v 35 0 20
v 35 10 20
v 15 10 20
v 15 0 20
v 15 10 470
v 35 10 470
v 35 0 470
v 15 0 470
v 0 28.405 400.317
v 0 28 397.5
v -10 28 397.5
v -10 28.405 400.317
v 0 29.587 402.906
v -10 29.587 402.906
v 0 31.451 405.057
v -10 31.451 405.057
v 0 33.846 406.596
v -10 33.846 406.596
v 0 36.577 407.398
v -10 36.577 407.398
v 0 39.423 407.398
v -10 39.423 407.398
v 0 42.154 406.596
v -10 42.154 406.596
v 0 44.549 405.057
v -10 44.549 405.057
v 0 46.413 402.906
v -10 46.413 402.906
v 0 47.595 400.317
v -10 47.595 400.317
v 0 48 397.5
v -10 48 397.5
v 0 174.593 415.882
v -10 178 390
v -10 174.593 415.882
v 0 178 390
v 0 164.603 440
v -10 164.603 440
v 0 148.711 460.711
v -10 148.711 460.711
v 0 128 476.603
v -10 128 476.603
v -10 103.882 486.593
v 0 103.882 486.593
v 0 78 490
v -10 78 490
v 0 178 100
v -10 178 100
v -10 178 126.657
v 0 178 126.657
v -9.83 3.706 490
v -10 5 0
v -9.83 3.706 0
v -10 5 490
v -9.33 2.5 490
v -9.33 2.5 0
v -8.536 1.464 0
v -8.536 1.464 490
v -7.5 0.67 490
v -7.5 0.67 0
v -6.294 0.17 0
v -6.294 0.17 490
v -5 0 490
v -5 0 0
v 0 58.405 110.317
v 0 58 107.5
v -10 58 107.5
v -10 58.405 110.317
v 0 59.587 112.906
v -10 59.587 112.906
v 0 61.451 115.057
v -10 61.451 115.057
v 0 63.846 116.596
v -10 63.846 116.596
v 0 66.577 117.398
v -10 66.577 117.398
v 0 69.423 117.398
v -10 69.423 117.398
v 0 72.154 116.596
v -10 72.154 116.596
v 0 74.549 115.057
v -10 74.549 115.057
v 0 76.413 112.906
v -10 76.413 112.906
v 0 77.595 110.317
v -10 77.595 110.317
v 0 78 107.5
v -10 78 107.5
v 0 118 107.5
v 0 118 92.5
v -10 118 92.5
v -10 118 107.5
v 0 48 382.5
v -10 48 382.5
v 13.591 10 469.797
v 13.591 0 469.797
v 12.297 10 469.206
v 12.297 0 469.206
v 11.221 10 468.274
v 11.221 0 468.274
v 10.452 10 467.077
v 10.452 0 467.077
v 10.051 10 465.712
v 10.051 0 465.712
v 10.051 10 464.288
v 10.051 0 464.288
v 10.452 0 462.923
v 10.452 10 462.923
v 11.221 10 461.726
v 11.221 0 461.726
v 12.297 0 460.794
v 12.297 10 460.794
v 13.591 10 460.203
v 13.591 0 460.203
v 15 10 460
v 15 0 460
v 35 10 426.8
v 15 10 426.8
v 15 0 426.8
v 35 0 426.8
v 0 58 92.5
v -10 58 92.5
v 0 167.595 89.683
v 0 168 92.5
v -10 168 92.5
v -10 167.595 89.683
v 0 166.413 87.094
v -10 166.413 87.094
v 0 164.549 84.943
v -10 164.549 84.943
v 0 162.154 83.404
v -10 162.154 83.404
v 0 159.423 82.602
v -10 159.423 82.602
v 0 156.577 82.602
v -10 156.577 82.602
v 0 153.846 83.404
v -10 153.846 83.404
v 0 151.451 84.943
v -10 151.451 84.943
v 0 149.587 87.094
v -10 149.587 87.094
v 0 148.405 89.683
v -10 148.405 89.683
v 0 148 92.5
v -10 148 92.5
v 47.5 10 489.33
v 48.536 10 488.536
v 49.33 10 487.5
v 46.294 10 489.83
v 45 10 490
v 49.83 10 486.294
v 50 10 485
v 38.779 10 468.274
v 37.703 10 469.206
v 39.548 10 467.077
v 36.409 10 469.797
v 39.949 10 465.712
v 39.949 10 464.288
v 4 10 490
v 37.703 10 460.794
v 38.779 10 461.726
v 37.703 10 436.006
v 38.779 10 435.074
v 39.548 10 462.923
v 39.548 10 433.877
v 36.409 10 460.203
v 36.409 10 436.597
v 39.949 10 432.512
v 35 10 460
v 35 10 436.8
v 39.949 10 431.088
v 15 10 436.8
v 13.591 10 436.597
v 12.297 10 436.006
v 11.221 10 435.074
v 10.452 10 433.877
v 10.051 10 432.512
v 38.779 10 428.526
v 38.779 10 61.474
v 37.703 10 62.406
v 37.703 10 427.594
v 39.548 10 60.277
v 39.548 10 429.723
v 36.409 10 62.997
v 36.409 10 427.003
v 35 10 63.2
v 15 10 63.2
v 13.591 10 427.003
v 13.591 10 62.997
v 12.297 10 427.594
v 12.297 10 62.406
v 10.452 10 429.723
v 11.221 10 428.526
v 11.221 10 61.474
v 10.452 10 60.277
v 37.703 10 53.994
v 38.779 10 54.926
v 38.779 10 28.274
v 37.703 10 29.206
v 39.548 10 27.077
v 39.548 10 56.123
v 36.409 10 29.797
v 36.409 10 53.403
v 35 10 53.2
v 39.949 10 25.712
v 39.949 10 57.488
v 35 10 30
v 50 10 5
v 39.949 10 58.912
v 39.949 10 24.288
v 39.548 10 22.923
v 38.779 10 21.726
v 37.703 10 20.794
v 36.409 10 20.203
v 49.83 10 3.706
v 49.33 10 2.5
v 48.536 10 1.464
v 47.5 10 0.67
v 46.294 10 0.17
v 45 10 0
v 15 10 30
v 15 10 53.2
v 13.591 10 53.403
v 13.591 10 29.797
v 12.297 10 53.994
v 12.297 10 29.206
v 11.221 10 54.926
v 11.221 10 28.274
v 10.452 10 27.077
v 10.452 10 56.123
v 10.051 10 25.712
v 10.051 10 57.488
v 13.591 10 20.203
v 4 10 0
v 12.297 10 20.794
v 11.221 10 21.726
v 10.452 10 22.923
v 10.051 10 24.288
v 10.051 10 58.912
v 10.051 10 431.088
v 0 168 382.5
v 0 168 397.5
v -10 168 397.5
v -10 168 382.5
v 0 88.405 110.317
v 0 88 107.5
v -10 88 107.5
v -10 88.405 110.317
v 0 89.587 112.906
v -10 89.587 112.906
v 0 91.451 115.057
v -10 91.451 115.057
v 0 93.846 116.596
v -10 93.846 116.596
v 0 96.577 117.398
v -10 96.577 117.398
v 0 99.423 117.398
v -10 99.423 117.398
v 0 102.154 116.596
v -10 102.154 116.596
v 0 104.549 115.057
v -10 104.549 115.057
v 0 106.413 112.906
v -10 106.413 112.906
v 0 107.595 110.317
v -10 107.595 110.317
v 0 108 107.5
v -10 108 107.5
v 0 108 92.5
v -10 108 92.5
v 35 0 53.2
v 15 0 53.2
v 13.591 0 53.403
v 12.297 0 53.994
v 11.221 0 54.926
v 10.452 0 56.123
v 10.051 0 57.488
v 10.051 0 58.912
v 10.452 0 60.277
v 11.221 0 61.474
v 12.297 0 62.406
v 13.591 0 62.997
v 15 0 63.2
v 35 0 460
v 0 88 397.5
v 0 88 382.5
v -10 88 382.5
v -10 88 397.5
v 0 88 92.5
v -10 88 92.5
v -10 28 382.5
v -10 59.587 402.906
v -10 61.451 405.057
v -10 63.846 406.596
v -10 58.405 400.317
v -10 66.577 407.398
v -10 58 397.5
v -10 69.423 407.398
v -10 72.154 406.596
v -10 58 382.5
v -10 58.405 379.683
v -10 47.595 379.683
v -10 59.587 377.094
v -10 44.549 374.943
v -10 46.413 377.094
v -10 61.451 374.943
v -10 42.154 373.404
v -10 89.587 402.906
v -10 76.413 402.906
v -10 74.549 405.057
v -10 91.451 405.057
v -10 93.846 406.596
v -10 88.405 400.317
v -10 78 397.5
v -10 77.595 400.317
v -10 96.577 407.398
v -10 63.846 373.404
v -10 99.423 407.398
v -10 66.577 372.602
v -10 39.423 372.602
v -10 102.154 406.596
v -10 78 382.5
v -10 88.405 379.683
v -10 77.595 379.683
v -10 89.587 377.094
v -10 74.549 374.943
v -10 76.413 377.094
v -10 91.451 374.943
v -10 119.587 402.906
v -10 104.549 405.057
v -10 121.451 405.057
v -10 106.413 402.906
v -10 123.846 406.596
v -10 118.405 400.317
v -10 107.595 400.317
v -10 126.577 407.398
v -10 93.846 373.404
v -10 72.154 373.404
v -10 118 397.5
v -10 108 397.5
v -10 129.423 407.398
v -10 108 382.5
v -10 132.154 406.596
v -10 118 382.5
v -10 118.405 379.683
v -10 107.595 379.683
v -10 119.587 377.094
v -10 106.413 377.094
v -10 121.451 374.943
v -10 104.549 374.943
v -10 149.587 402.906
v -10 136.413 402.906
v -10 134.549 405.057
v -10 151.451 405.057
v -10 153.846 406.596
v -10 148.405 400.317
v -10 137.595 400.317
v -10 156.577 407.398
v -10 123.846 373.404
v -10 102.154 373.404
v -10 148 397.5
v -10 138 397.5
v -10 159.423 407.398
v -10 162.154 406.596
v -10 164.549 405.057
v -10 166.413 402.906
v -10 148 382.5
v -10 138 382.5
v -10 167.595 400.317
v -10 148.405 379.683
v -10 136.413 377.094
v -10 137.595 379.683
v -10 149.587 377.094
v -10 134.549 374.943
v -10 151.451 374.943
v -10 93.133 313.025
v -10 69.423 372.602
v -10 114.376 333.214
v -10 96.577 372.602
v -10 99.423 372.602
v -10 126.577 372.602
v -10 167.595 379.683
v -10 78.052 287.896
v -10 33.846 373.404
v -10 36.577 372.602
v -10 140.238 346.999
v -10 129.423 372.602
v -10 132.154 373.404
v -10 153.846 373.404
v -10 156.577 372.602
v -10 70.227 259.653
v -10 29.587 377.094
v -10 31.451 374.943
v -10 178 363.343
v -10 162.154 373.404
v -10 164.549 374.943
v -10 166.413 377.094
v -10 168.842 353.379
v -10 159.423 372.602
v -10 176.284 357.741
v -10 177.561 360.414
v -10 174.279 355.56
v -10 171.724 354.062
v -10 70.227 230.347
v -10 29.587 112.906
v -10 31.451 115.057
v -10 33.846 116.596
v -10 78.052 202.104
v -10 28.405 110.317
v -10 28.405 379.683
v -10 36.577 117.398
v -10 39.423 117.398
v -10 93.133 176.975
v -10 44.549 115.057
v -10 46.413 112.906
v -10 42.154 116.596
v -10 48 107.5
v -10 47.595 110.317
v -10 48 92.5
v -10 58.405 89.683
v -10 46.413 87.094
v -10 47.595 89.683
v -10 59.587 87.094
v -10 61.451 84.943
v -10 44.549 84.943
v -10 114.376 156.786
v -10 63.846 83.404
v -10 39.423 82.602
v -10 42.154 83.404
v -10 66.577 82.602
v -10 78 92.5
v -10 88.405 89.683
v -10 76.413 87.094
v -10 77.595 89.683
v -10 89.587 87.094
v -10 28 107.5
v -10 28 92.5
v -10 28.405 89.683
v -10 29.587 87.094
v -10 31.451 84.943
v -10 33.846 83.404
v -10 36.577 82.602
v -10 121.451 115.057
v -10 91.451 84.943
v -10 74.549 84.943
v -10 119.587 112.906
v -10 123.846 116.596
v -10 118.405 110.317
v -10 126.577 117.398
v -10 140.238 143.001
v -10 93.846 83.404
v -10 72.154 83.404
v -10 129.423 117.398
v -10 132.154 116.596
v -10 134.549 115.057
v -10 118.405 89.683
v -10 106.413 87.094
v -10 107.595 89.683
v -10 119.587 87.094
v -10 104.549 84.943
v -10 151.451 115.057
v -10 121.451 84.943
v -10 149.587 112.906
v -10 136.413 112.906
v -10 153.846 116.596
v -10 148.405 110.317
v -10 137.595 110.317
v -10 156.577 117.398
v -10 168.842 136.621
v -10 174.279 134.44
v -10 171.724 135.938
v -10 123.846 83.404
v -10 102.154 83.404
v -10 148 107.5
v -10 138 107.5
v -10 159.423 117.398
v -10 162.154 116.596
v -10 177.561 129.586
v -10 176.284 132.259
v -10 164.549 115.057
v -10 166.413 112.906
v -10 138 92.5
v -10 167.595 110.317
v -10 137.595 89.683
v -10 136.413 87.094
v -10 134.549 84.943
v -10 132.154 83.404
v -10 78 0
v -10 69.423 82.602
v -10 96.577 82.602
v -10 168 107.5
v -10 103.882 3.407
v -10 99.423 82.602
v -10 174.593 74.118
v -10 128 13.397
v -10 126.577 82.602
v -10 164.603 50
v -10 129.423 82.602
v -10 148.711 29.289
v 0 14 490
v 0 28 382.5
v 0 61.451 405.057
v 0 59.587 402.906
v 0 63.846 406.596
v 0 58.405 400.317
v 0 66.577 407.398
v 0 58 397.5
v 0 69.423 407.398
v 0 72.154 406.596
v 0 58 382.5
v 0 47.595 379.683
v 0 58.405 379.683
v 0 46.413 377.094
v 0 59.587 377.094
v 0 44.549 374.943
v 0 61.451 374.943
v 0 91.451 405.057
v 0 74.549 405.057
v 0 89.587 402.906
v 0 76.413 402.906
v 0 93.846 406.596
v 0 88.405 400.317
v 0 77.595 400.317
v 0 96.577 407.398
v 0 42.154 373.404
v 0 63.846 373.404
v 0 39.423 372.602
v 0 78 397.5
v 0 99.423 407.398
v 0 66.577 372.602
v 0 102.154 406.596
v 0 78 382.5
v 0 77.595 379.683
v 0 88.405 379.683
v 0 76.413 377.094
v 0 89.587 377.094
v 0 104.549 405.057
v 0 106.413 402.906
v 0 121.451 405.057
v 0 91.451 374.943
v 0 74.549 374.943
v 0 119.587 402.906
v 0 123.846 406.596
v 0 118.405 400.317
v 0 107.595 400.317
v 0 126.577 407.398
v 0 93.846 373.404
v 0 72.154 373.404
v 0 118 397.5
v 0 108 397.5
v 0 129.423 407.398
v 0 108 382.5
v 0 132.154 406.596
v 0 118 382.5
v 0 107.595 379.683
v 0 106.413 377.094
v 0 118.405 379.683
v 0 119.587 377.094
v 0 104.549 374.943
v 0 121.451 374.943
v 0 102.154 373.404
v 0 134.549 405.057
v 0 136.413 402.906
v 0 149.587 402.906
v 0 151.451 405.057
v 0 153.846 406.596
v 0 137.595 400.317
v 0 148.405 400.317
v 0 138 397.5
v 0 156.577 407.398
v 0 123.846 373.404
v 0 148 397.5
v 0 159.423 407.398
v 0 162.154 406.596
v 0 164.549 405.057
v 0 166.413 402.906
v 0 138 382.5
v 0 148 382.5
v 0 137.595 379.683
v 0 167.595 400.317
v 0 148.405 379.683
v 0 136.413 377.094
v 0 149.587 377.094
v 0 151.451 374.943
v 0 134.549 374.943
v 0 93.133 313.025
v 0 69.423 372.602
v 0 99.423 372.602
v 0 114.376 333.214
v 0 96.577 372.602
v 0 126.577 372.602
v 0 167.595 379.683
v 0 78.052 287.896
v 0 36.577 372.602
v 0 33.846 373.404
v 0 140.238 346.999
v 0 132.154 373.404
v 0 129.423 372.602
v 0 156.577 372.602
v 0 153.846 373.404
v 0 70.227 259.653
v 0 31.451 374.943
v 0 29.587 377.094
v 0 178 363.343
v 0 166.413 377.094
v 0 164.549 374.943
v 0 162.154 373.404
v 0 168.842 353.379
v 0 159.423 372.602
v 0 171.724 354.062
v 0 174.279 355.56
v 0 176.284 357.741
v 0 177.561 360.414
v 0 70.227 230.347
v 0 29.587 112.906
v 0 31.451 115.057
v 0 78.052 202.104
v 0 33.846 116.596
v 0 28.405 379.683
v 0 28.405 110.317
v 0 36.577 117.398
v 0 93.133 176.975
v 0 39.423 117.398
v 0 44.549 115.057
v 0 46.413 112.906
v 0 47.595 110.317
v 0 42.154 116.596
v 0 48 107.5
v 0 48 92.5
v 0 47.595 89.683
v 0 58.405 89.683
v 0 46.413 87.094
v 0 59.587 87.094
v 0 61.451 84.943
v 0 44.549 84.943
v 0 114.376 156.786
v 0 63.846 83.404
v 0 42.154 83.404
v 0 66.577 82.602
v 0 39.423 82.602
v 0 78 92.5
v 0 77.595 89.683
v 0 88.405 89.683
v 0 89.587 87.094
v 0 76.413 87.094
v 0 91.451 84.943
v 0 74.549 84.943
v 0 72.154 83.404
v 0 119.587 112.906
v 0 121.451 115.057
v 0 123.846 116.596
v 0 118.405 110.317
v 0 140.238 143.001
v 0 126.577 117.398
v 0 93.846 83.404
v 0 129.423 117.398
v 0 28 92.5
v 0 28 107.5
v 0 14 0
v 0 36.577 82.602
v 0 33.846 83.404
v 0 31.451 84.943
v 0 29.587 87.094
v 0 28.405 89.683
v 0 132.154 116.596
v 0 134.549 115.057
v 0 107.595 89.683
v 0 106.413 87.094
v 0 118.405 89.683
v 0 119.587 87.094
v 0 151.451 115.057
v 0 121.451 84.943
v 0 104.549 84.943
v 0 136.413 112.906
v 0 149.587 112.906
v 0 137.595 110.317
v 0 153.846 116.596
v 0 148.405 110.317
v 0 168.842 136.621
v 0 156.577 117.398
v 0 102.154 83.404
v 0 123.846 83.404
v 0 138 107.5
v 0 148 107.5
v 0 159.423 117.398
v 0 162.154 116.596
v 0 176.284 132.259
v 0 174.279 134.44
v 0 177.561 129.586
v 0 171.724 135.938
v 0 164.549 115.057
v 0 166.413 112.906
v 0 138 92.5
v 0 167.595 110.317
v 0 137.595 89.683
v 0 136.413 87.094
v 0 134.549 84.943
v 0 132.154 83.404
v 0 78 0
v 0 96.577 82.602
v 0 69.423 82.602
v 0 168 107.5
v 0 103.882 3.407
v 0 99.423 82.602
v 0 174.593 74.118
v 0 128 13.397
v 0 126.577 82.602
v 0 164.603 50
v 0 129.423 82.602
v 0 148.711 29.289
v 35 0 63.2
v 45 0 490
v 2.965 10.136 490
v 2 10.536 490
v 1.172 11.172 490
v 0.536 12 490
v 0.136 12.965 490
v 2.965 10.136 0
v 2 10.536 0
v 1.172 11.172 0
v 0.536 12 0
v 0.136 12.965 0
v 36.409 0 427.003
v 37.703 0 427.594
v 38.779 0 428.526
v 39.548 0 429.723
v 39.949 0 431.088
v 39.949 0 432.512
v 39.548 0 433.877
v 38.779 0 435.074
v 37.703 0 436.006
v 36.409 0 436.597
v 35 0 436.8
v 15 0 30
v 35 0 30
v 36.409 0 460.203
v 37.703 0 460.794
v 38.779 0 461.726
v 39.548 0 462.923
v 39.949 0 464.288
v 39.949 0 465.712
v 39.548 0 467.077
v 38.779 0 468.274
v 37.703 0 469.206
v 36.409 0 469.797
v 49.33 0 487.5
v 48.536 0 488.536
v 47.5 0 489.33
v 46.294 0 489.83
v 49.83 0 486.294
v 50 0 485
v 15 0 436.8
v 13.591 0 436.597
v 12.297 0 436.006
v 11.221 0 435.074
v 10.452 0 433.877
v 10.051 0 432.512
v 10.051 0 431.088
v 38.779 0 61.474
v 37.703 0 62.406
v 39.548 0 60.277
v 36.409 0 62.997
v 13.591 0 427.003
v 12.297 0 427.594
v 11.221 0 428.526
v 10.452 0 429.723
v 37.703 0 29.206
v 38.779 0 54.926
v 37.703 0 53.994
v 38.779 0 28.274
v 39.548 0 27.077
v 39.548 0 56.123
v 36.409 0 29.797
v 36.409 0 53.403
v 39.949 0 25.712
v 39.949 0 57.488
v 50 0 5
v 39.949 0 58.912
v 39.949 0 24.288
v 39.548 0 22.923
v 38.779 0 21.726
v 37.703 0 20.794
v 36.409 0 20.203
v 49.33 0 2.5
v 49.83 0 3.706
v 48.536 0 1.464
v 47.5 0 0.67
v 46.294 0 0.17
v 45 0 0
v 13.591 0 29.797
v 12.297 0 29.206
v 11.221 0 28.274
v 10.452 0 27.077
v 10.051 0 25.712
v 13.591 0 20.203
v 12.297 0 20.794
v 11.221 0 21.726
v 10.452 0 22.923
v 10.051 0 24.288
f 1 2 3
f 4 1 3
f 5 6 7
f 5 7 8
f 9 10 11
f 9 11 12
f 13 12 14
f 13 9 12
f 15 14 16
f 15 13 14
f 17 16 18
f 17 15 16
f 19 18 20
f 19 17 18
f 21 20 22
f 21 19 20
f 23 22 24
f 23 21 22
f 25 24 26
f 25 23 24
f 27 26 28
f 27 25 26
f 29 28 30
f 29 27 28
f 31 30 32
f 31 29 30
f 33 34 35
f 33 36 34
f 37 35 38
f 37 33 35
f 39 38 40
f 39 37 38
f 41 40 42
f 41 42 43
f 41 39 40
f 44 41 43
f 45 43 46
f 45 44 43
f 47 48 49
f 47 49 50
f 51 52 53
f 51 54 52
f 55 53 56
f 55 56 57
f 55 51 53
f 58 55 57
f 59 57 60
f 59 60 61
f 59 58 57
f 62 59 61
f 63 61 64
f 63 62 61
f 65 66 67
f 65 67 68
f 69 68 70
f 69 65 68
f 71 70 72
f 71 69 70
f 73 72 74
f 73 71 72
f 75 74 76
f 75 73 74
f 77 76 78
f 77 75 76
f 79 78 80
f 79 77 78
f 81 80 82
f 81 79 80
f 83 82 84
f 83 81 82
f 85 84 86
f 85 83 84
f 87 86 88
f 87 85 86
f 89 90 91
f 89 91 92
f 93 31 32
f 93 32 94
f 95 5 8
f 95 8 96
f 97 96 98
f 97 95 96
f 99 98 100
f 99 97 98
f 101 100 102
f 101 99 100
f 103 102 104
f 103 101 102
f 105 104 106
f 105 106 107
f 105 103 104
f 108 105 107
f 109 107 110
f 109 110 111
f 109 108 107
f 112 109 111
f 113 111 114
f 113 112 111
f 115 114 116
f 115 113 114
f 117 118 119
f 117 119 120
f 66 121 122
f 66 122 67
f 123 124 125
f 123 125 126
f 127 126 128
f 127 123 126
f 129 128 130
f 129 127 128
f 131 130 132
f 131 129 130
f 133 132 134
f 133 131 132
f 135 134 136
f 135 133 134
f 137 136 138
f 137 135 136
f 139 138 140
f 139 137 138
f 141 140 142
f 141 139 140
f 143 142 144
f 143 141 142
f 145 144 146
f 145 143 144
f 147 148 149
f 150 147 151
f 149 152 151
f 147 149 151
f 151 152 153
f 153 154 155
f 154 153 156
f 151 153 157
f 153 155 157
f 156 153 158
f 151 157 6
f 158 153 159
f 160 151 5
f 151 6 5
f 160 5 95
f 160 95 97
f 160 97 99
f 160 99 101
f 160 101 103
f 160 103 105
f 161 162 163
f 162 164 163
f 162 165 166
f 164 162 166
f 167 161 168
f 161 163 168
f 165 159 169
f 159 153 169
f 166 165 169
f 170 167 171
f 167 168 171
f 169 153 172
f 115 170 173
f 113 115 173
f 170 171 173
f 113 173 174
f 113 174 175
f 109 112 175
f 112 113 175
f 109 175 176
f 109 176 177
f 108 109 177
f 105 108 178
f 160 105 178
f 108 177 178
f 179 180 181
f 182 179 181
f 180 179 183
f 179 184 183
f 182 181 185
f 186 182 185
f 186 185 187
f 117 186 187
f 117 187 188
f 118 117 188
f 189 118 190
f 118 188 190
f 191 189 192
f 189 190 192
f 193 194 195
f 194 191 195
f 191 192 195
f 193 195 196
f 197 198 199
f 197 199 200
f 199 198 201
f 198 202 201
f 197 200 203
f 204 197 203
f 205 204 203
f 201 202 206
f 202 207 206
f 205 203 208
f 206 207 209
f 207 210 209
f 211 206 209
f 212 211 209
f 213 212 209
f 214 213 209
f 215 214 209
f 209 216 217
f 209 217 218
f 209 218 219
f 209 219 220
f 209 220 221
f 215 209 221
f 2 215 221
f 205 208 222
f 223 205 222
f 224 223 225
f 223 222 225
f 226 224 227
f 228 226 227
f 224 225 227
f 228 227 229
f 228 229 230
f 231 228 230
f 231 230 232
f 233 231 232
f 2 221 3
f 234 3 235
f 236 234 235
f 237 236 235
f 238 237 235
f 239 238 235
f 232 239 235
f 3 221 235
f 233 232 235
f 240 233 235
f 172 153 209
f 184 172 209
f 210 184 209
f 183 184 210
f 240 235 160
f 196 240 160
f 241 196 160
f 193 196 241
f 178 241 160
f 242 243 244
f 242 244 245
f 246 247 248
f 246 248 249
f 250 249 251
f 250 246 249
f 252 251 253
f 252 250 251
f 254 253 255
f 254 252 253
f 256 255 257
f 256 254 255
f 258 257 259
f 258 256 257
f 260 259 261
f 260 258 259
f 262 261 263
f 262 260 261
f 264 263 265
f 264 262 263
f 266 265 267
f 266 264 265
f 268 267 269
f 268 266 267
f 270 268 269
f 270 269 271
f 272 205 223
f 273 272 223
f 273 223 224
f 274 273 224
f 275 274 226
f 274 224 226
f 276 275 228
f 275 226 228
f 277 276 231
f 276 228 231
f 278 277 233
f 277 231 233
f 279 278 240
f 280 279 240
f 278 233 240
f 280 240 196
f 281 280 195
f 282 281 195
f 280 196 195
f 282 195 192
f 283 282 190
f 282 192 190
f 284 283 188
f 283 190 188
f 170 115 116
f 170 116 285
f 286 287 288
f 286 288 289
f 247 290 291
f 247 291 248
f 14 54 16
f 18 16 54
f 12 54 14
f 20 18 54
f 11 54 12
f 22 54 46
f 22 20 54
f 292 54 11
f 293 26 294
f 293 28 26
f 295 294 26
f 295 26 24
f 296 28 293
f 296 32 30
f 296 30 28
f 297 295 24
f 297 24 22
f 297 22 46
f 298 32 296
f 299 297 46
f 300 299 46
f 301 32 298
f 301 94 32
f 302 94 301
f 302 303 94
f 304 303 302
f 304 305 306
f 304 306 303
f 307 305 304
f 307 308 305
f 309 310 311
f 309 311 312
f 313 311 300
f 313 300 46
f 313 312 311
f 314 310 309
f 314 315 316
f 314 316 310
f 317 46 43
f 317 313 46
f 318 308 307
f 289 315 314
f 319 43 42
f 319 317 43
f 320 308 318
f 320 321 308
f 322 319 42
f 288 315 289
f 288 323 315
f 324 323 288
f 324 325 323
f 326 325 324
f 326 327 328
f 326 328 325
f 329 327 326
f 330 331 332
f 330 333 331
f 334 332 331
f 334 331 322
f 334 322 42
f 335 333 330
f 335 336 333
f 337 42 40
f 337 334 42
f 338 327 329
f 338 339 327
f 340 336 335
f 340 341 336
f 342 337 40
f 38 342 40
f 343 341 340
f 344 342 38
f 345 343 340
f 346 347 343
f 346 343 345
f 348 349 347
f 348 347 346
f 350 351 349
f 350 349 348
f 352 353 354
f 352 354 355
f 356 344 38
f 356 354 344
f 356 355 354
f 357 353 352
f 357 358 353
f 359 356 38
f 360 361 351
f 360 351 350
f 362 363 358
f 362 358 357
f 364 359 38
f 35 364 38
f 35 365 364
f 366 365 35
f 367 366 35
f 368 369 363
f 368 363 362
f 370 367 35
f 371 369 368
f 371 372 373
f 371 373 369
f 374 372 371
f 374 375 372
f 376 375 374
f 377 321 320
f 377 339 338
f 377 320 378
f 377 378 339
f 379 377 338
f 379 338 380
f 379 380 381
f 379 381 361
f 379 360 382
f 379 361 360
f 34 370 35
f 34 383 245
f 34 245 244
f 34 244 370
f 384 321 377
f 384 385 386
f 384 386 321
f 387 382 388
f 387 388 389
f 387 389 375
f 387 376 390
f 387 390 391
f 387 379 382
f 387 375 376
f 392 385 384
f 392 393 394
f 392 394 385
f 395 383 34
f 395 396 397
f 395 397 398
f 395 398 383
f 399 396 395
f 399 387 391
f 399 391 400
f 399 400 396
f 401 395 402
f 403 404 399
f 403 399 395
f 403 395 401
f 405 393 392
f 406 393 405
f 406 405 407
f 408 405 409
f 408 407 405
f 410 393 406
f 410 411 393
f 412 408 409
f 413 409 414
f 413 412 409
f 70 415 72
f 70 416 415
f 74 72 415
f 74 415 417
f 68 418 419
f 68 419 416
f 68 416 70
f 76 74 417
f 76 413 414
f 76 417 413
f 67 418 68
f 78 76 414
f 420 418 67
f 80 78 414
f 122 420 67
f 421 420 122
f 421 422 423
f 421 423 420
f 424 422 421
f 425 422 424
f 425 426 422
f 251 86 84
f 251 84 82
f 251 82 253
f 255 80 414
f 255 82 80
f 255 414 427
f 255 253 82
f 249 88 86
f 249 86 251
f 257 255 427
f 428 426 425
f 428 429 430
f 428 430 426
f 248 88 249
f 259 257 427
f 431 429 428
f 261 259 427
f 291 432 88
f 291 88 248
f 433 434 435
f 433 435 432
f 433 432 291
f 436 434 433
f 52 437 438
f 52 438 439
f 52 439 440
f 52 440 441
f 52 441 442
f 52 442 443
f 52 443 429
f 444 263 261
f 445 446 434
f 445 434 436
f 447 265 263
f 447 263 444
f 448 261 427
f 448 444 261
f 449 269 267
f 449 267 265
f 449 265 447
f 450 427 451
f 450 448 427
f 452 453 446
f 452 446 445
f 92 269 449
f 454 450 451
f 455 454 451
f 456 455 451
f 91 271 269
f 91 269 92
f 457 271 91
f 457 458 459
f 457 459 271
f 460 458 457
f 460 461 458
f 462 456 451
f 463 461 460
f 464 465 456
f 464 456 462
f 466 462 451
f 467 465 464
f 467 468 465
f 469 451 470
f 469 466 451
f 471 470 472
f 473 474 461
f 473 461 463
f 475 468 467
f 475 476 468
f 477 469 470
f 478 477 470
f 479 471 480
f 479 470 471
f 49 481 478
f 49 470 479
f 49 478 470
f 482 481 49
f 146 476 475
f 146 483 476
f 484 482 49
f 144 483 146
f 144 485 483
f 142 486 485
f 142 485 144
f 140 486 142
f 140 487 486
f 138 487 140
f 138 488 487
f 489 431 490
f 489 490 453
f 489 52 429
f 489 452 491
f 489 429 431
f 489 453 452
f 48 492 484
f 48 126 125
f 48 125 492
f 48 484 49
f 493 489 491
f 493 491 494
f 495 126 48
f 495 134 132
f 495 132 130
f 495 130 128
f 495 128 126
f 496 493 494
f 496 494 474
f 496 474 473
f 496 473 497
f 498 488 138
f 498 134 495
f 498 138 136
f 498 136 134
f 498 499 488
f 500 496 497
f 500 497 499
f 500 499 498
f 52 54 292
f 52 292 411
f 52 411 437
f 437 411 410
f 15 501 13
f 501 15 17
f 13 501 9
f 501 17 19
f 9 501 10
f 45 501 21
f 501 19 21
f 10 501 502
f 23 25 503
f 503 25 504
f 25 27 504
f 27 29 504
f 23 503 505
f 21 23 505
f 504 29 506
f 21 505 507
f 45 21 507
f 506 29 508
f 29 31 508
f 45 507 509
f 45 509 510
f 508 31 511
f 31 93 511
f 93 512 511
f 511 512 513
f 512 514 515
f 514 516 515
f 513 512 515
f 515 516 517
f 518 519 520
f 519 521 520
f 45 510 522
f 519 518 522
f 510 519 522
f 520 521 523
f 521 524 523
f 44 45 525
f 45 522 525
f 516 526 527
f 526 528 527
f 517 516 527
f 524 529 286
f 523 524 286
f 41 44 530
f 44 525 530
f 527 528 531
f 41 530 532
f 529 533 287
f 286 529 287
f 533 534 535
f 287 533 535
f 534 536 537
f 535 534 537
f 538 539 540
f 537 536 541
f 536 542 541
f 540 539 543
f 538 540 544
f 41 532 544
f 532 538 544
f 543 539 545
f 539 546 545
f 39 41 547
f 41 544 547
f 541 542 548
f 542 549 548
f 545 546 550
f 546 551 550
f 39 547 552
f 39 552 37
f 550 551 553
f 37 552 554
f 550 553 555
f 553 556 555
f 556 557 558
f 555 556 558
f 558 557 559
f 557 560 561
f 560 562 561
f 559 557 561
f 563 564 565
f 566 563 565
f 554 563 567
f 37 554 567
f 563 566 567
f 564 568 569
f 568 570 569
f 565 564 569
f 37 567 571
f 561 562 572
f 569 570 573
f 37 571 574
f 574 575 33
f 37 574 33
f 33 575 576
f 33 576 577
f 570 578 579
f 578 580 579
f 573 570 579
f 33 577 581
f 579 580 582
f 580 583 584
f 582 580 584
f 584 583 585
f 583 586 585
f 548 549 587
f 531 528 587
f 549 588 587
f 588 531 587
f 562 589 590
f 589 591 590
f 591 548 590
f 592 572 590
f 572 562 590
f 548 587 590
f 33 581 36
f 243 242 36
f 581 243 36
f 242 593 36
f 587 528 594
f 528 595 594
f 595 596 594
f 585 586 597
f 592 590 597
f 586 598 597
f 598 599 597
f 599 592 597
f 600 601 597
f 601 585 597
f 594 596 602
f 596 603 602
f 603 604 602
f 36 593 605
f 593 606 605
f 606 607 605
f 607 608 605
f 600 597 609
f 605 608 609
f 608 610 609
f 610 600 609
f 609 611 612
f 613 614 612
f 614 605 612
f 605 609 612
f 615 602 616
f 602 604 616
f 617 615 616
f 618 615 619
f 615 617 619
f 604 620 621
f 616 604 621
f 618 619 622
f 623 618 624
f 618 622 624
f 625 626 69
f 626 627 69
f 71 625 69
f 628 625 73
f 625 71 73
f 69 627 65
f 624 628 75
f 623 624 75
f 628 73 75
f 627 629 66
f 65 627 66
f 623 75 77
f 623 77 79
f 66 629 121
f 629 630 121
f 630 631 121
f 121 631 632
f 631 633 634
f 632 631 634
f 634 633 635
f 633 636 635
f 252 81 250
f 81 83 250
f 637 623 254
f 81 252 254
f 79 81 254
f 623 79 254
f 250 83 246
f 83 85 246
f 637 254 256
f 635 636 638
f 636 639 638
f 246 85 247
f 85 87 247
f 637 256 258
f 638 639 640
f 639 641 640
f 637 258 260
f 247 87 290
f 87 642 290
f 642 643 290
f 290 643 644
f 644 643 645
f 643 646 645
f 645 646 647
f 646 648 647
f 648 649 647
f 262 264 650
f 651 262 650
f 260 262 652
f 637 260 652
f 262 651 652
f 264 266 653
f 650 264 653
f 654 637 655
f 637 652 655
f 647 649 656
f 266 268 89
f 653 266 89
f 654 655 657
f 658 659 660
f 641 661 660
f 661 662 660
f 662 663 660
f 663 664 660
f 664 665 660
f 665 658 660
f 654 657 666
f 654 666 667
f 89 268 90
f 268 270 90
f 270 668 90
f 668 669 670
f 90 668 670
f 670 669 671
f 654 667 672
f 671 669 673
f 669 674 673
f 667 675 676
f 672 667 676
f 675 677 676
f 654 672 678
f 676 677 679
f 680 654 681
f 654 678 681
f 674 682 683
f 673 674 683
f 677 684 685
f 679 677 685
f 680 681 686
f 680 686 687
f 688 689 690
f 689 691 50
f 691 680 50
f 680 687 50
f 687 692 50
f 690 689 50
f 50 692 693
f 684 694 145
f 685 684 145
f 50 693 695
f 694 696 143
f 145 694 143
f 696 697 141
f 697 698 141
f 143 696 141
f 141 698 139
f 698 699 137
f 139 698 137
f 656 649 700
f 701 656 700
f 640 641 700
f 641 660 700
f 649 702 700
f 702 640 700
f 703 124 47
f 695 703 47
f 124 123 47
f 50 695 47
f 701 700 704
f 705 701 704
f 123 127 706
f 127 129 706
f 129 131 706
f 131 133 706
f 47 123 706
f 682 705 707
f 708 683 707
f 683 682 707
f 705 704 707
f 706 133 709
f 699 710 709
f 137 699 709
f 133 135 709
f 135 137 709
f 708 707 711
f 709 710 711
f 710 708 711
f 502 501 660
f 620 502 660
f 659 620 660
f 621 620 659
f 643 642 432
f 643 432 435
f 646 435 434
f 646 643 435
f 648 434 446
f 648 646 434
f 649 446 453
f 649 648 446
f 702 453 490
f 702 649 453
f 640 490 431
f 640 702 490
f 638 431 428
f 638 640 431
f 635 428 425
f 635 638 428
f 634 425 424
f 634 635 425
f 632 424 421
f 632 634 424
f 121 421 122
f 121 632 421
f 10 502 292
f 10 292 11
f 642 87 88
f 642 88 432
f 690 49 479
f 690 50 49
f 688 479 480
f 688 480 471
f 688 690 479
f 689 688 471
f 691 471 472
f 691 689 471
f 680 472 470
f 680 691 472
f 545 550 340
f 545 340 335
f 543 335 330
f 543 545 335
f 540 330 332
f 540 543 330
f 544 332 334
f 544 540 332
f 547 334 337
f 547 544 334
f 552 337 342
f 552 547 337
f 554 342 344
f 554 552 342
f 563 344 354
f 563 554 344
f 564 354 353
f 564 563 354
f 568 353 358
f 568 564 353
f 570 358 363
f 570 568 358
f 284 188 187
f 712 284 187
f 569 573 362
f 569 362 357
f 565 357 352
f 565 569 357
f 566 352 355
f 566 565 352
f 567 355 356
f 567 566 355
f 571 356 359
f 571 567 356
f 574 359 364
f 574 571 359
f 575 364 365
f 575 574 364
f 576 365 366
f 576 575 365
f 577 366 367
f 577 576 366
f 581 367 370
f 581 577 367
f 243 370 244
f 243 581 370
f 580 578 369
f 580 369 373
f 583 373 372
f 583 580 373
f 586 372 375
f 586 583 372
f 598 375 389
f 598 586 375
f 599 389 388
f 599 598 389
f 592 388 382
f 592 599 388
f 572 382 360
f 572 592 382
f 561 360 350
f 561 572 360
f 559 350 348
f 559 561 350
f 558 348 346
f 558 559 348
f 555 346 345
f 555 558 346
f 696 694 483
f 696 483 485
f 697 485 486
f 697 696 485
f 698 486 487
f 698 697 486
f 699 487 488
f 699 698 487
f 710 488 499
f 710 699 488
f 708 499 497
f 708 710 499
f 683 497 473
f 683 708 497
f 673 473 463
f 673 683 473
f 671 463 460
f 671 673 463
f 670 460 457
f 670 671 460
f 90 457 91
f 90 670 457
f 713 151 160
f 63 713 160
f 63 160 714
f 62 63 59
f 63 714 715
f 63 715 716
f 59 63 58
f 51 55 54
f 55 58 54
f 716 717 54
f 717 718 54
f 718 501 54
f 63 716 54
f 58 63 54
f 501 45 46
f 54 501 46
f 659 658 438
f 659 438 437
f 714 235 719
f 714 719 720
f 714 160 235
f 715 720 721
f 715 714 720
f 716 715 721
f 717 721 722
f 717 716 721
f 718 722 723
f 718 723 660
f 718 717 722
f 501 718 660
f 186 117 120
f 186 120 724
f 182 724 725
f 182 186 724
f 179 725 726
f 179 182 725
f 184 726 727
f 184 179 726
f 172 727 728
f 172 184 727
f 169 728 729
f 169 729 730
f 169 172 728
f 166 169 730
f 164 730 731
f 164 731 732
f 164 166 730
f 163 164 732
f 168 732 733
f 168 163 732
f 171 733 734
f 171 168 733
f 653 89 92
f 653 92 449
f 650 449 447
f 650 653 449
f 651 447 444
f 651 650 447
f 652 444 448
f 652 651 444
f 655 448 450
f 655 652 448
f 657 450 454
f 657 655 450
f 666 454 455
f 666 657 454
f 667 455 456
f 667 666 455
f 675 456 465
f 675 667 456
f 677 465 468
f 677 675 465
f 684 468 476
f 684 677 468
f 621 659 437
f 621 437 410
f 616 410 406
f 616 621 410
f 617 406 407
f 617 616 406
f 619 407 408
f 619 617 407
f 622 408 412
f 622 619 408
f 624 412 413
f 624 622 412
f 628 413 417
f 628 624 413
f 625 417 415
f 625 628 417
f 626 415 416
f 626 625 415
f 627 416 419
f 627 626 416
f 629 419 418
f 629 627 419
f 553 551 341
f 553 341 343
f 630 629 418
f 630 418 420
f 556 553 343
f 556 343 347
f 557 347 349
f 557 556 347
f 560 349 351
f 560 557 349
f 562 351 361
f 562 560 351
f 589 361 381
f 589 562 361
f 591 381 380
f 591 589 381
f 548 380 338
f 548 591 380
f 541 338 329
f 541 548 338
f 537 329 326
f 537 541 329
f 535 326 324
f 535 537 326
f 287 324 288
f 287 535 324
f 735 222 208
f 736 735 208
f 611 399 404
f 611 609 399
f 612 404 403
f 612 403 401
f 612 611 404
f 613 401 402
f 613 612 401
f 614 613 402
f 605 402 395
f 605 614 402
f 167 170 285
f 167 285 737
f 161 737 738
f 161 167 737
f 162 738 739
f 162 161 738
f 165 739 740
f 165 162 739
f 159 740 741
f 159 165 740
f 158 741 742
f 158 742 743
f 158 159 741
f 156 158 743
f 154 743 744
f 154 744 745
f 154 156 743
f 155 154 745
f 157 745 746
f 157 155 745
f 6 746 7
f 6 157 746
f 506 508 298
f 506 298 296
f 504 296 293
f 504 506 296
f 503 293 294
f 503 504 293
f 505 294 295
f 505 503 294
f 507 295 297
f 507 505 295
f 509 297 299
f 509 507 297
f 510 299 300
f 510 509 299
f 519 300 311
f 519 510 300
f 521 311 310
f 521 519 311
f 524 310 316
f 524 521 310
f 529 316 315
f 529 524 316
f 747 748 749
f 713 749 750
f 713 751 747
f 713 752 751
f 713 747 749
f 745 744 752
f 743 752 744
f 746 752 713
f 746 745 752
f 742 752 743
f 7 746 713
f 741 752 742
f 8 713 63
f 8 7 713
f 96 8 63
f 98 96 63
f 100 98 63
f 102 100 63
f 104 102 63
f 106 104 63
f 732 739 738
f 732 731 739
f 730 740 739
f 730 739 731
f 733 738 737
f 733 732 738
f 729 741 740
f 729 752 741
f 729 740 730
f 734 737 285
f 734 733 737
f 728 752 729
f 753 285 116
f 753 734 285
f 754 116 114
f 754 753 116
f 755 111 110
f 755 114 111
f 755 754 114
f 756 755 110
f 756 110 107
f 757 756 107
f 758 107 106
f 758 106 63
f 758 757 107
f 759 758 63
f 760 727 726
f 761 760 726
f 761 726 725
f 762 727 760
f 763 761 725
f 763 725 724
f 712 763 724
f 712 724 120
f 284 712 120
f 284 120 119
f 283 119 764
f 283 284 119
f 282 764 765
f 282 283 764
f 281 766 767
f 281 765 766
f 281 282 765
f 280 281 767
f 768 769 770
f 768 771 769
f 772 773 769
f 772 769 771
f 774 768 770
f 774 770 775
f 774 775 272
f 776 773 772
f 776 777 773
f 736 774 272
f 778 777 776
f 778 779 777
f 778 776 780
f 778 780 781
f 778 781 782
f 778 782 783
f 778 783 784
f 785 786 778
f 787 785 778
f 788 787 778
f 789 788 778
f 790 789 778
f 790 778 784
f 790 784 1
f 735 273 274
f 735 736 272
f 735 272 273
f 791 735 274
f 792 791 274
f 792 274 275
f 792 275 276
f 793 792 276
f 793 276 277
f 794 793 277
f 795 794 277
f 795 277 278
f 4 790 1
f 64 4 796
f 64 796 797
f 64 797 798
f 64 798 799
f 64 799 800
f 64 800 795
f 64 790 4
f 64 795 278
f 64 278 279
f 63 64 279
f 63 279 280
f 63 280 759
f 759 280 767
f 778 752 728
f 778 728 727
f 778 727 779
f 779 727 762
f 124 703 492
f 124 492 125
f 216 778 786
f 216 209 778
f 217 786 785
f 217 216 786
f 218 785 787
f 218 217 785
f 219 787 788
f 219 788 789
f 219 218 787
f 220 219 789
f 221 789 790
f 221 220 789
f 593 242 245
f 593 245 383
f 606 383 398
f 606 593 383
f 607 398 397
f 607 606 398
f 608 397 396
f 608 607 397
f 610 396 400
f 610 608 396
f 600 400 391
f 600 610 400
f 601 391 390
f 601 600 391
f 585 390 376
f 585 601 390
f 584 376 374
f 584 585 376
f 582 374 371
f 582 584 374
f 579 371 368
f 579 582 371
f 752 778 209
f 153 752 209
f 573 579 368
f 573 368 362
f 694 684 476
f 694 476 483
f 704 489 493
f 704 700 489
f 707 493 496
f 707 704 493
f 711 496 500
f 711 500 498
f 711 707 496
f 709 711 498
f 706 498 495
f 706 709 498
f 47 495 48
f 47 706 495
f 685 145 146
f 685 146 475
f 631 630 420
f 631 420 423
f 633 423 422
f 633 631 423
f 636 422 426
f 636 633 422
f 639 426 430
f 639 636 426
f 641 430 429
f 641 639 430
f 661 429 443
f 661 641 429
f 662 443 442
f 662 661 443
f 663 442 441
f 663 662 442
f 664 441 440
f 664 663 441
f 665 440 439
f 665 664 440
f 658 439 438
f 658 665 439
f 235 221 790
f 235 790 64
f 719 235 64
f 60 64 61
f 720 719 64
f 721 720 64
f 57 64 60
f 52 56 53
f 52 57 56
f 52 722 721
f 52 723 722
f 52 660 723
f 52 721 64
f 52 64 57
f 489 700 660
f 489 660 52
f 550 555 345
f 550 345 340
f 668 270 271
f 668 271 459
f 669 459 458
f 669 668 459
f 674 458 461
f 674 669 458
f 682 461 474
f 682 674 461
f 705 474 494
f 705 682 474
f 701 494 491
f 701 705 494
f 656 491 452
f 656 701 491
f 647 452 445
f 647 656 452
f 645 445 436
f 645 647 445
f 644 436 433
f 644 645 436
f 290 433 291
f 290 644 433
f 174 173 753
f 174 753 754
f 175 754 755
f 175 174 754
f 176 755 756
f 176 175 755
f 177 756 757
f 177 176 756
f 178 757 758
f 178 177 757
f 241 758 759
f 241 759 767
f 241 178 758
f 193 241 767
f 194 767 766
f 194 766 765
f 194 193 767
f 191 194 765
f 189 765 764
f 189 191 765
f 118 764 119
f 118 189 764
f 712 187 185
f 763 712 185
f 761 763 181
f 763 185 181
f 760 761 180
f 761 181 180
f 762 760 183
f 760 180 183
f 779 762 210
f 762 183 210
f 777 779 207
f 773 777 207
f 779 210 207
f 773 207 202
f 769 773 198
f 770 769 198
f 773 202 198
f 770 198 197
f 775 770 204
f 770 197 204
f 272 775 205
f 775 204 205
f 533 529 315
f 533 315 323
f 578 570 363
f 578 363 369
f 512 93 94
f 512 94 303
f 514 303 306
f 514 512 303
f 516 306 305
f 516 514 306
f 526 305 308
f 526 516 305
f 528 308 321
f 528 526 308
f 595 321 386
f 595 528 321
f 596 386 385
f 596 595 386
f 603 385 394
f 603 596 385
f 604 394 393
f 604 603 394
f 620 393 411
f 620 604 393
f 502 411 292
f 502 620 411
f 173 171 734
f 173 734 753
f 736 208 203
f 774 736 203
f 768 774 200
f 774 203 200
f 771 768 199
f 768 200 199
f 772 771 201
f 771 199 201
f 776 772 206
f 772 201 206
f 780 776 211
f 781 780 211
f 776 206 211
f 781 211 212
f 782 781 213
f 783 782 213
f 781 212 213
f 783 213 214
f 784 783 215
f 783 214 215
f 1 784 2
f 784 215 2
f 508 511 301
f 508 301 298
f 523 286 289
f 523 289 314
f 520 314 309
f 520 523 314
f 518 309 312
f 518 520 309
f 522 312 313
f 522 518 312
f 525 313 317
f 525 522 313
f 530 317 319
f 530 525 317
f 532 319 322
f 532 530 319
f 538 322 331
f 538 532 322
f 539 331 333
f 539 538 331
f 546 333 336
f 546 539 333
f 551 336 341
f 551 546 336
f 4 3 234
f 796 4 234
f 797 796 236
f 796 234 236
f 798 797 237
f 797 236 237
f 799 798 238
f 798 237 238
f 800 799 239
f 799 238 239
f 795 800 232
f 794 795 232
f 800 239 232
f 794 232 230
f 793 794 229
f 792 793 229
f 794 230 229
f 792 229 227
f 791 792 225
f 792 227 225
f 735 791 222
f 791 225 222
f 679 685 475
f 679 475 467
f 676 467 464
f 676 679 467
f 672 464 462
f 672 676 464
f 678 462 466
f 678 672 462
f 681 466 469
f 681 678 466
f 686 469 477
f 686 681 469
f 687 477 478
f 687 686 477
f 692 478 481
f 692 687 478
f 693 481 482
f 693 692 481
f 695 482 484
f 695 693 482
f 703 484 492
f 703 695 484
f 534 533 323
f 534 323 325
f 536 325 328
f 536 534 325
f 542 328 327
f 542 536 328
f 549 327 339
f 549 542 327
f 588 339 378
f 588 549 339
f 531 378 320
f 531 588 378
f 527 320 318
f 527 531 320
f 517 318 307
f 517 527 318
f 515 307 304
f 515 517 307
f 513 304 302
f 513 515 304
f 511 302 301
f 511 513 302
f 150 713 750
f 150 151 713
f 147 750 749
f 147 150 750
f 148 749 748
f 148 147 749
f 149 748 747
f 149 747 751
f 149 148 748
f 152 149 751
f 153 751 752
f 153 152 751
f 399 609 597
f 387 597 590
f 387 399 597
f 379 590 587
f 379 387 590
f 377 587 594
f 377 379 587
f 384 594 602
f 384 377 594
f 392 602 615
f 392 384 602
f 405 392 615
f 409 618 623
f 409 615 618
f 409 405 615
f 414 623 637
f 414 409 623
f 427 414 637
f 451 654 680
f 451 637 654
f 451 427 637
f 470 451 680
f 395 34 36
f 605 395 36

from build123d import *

# Parameters (mm, degrees)
SZKIC1_W                    = 10
SZKIC1_H                    = 178
DODANIE_WYCI_GNI_CIE1_DEPTH = 490
WYTNIJ_WYCI_GNI_CIE1_DEPTH  = 522.424970633
WYTNIJ_WYCI_GNI_CIE2_DEPTH  = 522.424970633
ZAOKR_GLENIE1_R             = 100
ZAOKR_GLENIE2_R             = 100
WYTNIJ_WYCI_GNI_CIE3_DEPTH  = 522.424970633
ZAOKR_GLENIE3_R             = 10
SZKIC6_W                    = 60
SZKIC6_H                    = 10
DODANIE_WYCI_GNI_CIE2_DEPTH = 490
ZAOKR_GLENIE4_R             = 5
ZAOKR_GLENIE5_R             = 4
ZAOKR_GLENIE6_R             = 5
WYTNIJ_WYCI_GNI_CIE4_DEPTH  = 10
WYTNIJ_WYCI_GNI_CIE5_DEPTH  = 10


with BuildPart() as part:
    # Szkic1 → Dodanie-wyciągnięcie1 (new body)
    with BuildSketch(Plane.XY):
        with Locations((-5, 89)):
            Rectangle(SZKIC1_W, SZKIC1_H)
    extrude(amount=DODANIE_WYCI_GNI_CIE1_DEPTH)

    # Szkic2 → Wytnij-wyciągnięcie1 (cut, through all)
    with BuildSketch(Plane(origin=(0, 0, 0), x_dir=(0, 0, -1), z_dir=(1, 0, 0))):
        with BuildLine():
            Line((-107.5, 168), (-92.5, 168))
            ThreePointArc((-92.5, 168), (-82.5, 158), (-92.5, 148))
            Line((-92.5, 148), (-107.5, 148))
            ThreePointArc((-107.5, 148), (-117.5, 158), (-107.5, 168))
        make_face()
        with BuildLine():
            Line((-107.5, 138), (-92.5, 138))
            ThreePointArc((-92.5, 138), (-82.5, 128), (-92.5, 118))
            Line((-92.5, 118), (-107.5, 118))
            ThreePointArc((-107.5, 118), (-117.5, 128), (-107.5, 138))
        make_face()
        with BuildLine():
            Line((-107.5, 108), (-92.5, 108))
            ThreePointArc((-92.5, 108), (-82.5, 98), (-92.5, 88))
            Line((-92.5, 88), (-107.5, 88))
            ThreePointArc((-107.5, 88), (-117.5, 98), (-107.5, 108))
        make_face()
        with BuildLine():
            Line((-107.5, 78), (-92.5, 78))
            ThreePointArc((-92.5, 78), (-82.5, 68), (-92.5, 58))
            Line((-92.5, 58), (-107.5, 58))
            ThreePointArc((-107.5, 58), (-117.5, 68), (-107.5, 78))
        make_face()
        with BuildLine():
            Line((-107.5, 48), (-92.5, 48))
            ThreePointArc((-92.5, 48), (-82.5, 38), (-92.5, 28))
            Line((-92.5, 28), (-107.5, 28))
            ThreePointArc((-107.5, 28), (-117.5, 38), (-107.5, 48))
        make_face()
    extrude(amount=-WYTNIJ_WYCI_GNI_CIE1_DEPTH, mode=Mode.SUBTRACT)

    # Szkic3 → Wytnij-wyciągnięcie2 (cut, through all)
    with BuildSketch(Plane(origin=(0, 0, 0), x_dir=(0, 0, -1), z_dir=(1, 0, 0))):
        with BuildLine():
            Line((-397.5, 168), (-382.5, 168))
            ThreePointArc((-382.5, 168), (-372.5, 158), (-382.5, 148))
            Line((-382.5, 148), (-397.5, 148))
            ThreePointArc((-397.5, 148), (-407.5, 158), (-397.5, 168))
        make_face()
        with BuildLine():
            Line((-397.5, 138), (-382.5, 138))
            ThreePointArc((-382.5, 138), (-372.5, 128), (-382.5, 118))
            Line((-382.5, 118), (-397.5, 118))
            ThreePointArc((-397.5, 118), (-407.5, 128), (-397.5, 138))
        make_face()
        with BuildLine():
            Line((-397.5, 108), (-382.5, 108))
            ThreePointArc((-382.5, 108), (-372.5, 98), (-382.5, 88))
            Line((-382.5, 88), (-397.5, 88))
            ThreePointArc((-397.5, 88), (-407.5, 98), (-397.5, 108))
        make_face()
        with BuildLine():
            Line((-397.5, 78), (-382.5, 78))
            ThreePointArc((-382.5, 78), (-372.5, 68), (-382.5, 58))
            Line((-382.5, 58), (-397.5, 58))
            ThreePointArc((-397.5, 58), (-407.5, 68), (-397.5, 78))
        make_face()
        with BuildLine():
            Line((-397.5, 48), (-382.5, 48))
            ThreePointArc((-382.5, 48), (-372.5, 38), (-382.5, 28))
            Line((-382.5, 28), (-397.5, 28))
            ThreePointArc((-397.5, 28), (-407.5, 38), (-397.5, 48))
        make_face()
    extrude(amount=-WYTNIJ_WYCI_GNI_CIE2_DEPTH, mode=Mode.SUBTRACT)

    # Zaokrąglenie1
    zaokr_glenie1_edges = [part.edges().sort_by_distance(p)[0] for p in [
        (-5, 178, 0),
    ]]
    fillet(zaokr_glenie1_edges, radius=ZAOKR_GLENIE1_R)

    # Zaokrąglenie2
    zaokr_glenie2_edges = [part.edges().sort_by_distance(p)[0] for p in [
        (-5, 178, 490),
    ]]
    fillet(zaokr_glenie2_edges, radius=ZAOKR_GLENIE2_R)

    # Szkic5 → Wytnij-wyciągnięcie3 (cut, through all)
    with BuildSketch(Plane.ZY.offset(10)):
        with BuildLine():
            Line((136.235236097, 178), (353.764763903, 178))
            ThreePointArc((353.764763903, 178), (245, 69.235236097), (136.235236097, 178))
        make_face()
    extrude(amount=-WYTNIJ_WYCI_GNI_CIE3_DEPTH, mode=Mode.SUBTRACT)

    # Zaokrąglenie3
    zaokr_glenie3_edges = [part.edges().sort_by_distance(p)[0] for p in [
        (-5, 178, 353.764763903),
        (-5, 178, 136.235236097),
    ]]
    fillet(zaokr_glenie3_edges, radius=ZAOKR_GLENIE3_R)

    # Szkic6 → Dodanie-wyciągnięcie2 (add, through all)
    with BuildSketch(Plane(origin=(0, 0, 0), x_dir=(-1, 0, 0), z_dir=(0, 0, -1))):
        with Locations((-20, 5)):
            Rectangle(SZKIC6_W, SZKIC6_H)
    extrude(amount=-DODANIE_WYCI_GNI_CIE2_DEPTH)

    # Zaokrąglenie4
    zaokr_glenie4_edges = [part.edges().sort_by_distance(p)[0] for p in [
        (-10, 0, 245),
    ]]
    fillet(zaokr_glenie4_edges, radius=ZAOKR_GLENIE4_R)

    # Zaokrąglenie5
    zaokr_glenie5_edges = [part.edges().sort_by_distance(p)[0] for p in [
        (0, 10, 245),
    ]]
    fillet(zaokr_glenie5_edges, radius=ZAOKR_GLENIE5_R)

    # Zaokrąglenie6
    zaokr_glenie6_edges = [part.edges().sort_by_distance(p)[0] for p in [
        (50, 5, 0),
        (50, 5, 490),
    ]]
    fillet(zaokr_glenie6_edges, radius=ZAOKR_GLENIE6_R)

    # Szkic7 → Wytnij-wyciągnięcie4 (cut)
    with BuildSketch(Plane(origin=(0, 10, 0), x_dir=(1, 0, 0), z_dir=(0, 1, 0))):
        with BuildLine():
            Line((35, -470), (15, -470))
            ThreePointArc((15, -470), (10, -465), (15, -460))
            Line((15, -460), (35, -460))
            ThreePointArc((35, -460), (40, -465), (35, -470))
        make_face()
    wytnij_wyci_gni_cie4 = extrude(amount=-WYTNIJ_WYCI_GNI_CIE4_DEPTH, mode=Mode.SUBTRACT)

    # Lustro2: Wytnij-wyciągnięcie4 across plane
    add(wytnij_wyci_gni_cie4.mirror(Plane(origin=(0, 0, 245), x_dir=(1, 0, 0), z_dir=(0, 0, -1))), mode=Mode.SUBTRACT)

    # Szkic8 → Wytnij-wyciągnięcie5 (cut)
    with BuildSketch(Plane(origin=(0, 10, 0), x_dir=(1, 0, 0), z_dir=(0, 1, 0))):
        with BuildLine():
            Line((15, -426.8), (35, -426.8))
            ThreePointArc((35, -426.8), (40, -431.8), (35, -436.8))
            Line((35, -436.8), (15, -436.8))
            ThreePointArc((15, -436.8), (10, -431.8), (15, -426.8))
        make_face()
    wytnij_wyci_gni_cie5 = extrude(amount=-WYTNIJ_WYCI_GNI_CIE5_DEPTH, mode=Mode.SUBTRACT)

    # Lustro3: Wytnij-wyciągnięcie5 across plane
    add(wytnij_wyci_gni_cie5.mirror(Plane(origin=(0, 0, 245), x_dir=(1, 0, 0), z_dir=(0, 0, -1))), mode=Mode.SUBTRACT)


solid = part.part
